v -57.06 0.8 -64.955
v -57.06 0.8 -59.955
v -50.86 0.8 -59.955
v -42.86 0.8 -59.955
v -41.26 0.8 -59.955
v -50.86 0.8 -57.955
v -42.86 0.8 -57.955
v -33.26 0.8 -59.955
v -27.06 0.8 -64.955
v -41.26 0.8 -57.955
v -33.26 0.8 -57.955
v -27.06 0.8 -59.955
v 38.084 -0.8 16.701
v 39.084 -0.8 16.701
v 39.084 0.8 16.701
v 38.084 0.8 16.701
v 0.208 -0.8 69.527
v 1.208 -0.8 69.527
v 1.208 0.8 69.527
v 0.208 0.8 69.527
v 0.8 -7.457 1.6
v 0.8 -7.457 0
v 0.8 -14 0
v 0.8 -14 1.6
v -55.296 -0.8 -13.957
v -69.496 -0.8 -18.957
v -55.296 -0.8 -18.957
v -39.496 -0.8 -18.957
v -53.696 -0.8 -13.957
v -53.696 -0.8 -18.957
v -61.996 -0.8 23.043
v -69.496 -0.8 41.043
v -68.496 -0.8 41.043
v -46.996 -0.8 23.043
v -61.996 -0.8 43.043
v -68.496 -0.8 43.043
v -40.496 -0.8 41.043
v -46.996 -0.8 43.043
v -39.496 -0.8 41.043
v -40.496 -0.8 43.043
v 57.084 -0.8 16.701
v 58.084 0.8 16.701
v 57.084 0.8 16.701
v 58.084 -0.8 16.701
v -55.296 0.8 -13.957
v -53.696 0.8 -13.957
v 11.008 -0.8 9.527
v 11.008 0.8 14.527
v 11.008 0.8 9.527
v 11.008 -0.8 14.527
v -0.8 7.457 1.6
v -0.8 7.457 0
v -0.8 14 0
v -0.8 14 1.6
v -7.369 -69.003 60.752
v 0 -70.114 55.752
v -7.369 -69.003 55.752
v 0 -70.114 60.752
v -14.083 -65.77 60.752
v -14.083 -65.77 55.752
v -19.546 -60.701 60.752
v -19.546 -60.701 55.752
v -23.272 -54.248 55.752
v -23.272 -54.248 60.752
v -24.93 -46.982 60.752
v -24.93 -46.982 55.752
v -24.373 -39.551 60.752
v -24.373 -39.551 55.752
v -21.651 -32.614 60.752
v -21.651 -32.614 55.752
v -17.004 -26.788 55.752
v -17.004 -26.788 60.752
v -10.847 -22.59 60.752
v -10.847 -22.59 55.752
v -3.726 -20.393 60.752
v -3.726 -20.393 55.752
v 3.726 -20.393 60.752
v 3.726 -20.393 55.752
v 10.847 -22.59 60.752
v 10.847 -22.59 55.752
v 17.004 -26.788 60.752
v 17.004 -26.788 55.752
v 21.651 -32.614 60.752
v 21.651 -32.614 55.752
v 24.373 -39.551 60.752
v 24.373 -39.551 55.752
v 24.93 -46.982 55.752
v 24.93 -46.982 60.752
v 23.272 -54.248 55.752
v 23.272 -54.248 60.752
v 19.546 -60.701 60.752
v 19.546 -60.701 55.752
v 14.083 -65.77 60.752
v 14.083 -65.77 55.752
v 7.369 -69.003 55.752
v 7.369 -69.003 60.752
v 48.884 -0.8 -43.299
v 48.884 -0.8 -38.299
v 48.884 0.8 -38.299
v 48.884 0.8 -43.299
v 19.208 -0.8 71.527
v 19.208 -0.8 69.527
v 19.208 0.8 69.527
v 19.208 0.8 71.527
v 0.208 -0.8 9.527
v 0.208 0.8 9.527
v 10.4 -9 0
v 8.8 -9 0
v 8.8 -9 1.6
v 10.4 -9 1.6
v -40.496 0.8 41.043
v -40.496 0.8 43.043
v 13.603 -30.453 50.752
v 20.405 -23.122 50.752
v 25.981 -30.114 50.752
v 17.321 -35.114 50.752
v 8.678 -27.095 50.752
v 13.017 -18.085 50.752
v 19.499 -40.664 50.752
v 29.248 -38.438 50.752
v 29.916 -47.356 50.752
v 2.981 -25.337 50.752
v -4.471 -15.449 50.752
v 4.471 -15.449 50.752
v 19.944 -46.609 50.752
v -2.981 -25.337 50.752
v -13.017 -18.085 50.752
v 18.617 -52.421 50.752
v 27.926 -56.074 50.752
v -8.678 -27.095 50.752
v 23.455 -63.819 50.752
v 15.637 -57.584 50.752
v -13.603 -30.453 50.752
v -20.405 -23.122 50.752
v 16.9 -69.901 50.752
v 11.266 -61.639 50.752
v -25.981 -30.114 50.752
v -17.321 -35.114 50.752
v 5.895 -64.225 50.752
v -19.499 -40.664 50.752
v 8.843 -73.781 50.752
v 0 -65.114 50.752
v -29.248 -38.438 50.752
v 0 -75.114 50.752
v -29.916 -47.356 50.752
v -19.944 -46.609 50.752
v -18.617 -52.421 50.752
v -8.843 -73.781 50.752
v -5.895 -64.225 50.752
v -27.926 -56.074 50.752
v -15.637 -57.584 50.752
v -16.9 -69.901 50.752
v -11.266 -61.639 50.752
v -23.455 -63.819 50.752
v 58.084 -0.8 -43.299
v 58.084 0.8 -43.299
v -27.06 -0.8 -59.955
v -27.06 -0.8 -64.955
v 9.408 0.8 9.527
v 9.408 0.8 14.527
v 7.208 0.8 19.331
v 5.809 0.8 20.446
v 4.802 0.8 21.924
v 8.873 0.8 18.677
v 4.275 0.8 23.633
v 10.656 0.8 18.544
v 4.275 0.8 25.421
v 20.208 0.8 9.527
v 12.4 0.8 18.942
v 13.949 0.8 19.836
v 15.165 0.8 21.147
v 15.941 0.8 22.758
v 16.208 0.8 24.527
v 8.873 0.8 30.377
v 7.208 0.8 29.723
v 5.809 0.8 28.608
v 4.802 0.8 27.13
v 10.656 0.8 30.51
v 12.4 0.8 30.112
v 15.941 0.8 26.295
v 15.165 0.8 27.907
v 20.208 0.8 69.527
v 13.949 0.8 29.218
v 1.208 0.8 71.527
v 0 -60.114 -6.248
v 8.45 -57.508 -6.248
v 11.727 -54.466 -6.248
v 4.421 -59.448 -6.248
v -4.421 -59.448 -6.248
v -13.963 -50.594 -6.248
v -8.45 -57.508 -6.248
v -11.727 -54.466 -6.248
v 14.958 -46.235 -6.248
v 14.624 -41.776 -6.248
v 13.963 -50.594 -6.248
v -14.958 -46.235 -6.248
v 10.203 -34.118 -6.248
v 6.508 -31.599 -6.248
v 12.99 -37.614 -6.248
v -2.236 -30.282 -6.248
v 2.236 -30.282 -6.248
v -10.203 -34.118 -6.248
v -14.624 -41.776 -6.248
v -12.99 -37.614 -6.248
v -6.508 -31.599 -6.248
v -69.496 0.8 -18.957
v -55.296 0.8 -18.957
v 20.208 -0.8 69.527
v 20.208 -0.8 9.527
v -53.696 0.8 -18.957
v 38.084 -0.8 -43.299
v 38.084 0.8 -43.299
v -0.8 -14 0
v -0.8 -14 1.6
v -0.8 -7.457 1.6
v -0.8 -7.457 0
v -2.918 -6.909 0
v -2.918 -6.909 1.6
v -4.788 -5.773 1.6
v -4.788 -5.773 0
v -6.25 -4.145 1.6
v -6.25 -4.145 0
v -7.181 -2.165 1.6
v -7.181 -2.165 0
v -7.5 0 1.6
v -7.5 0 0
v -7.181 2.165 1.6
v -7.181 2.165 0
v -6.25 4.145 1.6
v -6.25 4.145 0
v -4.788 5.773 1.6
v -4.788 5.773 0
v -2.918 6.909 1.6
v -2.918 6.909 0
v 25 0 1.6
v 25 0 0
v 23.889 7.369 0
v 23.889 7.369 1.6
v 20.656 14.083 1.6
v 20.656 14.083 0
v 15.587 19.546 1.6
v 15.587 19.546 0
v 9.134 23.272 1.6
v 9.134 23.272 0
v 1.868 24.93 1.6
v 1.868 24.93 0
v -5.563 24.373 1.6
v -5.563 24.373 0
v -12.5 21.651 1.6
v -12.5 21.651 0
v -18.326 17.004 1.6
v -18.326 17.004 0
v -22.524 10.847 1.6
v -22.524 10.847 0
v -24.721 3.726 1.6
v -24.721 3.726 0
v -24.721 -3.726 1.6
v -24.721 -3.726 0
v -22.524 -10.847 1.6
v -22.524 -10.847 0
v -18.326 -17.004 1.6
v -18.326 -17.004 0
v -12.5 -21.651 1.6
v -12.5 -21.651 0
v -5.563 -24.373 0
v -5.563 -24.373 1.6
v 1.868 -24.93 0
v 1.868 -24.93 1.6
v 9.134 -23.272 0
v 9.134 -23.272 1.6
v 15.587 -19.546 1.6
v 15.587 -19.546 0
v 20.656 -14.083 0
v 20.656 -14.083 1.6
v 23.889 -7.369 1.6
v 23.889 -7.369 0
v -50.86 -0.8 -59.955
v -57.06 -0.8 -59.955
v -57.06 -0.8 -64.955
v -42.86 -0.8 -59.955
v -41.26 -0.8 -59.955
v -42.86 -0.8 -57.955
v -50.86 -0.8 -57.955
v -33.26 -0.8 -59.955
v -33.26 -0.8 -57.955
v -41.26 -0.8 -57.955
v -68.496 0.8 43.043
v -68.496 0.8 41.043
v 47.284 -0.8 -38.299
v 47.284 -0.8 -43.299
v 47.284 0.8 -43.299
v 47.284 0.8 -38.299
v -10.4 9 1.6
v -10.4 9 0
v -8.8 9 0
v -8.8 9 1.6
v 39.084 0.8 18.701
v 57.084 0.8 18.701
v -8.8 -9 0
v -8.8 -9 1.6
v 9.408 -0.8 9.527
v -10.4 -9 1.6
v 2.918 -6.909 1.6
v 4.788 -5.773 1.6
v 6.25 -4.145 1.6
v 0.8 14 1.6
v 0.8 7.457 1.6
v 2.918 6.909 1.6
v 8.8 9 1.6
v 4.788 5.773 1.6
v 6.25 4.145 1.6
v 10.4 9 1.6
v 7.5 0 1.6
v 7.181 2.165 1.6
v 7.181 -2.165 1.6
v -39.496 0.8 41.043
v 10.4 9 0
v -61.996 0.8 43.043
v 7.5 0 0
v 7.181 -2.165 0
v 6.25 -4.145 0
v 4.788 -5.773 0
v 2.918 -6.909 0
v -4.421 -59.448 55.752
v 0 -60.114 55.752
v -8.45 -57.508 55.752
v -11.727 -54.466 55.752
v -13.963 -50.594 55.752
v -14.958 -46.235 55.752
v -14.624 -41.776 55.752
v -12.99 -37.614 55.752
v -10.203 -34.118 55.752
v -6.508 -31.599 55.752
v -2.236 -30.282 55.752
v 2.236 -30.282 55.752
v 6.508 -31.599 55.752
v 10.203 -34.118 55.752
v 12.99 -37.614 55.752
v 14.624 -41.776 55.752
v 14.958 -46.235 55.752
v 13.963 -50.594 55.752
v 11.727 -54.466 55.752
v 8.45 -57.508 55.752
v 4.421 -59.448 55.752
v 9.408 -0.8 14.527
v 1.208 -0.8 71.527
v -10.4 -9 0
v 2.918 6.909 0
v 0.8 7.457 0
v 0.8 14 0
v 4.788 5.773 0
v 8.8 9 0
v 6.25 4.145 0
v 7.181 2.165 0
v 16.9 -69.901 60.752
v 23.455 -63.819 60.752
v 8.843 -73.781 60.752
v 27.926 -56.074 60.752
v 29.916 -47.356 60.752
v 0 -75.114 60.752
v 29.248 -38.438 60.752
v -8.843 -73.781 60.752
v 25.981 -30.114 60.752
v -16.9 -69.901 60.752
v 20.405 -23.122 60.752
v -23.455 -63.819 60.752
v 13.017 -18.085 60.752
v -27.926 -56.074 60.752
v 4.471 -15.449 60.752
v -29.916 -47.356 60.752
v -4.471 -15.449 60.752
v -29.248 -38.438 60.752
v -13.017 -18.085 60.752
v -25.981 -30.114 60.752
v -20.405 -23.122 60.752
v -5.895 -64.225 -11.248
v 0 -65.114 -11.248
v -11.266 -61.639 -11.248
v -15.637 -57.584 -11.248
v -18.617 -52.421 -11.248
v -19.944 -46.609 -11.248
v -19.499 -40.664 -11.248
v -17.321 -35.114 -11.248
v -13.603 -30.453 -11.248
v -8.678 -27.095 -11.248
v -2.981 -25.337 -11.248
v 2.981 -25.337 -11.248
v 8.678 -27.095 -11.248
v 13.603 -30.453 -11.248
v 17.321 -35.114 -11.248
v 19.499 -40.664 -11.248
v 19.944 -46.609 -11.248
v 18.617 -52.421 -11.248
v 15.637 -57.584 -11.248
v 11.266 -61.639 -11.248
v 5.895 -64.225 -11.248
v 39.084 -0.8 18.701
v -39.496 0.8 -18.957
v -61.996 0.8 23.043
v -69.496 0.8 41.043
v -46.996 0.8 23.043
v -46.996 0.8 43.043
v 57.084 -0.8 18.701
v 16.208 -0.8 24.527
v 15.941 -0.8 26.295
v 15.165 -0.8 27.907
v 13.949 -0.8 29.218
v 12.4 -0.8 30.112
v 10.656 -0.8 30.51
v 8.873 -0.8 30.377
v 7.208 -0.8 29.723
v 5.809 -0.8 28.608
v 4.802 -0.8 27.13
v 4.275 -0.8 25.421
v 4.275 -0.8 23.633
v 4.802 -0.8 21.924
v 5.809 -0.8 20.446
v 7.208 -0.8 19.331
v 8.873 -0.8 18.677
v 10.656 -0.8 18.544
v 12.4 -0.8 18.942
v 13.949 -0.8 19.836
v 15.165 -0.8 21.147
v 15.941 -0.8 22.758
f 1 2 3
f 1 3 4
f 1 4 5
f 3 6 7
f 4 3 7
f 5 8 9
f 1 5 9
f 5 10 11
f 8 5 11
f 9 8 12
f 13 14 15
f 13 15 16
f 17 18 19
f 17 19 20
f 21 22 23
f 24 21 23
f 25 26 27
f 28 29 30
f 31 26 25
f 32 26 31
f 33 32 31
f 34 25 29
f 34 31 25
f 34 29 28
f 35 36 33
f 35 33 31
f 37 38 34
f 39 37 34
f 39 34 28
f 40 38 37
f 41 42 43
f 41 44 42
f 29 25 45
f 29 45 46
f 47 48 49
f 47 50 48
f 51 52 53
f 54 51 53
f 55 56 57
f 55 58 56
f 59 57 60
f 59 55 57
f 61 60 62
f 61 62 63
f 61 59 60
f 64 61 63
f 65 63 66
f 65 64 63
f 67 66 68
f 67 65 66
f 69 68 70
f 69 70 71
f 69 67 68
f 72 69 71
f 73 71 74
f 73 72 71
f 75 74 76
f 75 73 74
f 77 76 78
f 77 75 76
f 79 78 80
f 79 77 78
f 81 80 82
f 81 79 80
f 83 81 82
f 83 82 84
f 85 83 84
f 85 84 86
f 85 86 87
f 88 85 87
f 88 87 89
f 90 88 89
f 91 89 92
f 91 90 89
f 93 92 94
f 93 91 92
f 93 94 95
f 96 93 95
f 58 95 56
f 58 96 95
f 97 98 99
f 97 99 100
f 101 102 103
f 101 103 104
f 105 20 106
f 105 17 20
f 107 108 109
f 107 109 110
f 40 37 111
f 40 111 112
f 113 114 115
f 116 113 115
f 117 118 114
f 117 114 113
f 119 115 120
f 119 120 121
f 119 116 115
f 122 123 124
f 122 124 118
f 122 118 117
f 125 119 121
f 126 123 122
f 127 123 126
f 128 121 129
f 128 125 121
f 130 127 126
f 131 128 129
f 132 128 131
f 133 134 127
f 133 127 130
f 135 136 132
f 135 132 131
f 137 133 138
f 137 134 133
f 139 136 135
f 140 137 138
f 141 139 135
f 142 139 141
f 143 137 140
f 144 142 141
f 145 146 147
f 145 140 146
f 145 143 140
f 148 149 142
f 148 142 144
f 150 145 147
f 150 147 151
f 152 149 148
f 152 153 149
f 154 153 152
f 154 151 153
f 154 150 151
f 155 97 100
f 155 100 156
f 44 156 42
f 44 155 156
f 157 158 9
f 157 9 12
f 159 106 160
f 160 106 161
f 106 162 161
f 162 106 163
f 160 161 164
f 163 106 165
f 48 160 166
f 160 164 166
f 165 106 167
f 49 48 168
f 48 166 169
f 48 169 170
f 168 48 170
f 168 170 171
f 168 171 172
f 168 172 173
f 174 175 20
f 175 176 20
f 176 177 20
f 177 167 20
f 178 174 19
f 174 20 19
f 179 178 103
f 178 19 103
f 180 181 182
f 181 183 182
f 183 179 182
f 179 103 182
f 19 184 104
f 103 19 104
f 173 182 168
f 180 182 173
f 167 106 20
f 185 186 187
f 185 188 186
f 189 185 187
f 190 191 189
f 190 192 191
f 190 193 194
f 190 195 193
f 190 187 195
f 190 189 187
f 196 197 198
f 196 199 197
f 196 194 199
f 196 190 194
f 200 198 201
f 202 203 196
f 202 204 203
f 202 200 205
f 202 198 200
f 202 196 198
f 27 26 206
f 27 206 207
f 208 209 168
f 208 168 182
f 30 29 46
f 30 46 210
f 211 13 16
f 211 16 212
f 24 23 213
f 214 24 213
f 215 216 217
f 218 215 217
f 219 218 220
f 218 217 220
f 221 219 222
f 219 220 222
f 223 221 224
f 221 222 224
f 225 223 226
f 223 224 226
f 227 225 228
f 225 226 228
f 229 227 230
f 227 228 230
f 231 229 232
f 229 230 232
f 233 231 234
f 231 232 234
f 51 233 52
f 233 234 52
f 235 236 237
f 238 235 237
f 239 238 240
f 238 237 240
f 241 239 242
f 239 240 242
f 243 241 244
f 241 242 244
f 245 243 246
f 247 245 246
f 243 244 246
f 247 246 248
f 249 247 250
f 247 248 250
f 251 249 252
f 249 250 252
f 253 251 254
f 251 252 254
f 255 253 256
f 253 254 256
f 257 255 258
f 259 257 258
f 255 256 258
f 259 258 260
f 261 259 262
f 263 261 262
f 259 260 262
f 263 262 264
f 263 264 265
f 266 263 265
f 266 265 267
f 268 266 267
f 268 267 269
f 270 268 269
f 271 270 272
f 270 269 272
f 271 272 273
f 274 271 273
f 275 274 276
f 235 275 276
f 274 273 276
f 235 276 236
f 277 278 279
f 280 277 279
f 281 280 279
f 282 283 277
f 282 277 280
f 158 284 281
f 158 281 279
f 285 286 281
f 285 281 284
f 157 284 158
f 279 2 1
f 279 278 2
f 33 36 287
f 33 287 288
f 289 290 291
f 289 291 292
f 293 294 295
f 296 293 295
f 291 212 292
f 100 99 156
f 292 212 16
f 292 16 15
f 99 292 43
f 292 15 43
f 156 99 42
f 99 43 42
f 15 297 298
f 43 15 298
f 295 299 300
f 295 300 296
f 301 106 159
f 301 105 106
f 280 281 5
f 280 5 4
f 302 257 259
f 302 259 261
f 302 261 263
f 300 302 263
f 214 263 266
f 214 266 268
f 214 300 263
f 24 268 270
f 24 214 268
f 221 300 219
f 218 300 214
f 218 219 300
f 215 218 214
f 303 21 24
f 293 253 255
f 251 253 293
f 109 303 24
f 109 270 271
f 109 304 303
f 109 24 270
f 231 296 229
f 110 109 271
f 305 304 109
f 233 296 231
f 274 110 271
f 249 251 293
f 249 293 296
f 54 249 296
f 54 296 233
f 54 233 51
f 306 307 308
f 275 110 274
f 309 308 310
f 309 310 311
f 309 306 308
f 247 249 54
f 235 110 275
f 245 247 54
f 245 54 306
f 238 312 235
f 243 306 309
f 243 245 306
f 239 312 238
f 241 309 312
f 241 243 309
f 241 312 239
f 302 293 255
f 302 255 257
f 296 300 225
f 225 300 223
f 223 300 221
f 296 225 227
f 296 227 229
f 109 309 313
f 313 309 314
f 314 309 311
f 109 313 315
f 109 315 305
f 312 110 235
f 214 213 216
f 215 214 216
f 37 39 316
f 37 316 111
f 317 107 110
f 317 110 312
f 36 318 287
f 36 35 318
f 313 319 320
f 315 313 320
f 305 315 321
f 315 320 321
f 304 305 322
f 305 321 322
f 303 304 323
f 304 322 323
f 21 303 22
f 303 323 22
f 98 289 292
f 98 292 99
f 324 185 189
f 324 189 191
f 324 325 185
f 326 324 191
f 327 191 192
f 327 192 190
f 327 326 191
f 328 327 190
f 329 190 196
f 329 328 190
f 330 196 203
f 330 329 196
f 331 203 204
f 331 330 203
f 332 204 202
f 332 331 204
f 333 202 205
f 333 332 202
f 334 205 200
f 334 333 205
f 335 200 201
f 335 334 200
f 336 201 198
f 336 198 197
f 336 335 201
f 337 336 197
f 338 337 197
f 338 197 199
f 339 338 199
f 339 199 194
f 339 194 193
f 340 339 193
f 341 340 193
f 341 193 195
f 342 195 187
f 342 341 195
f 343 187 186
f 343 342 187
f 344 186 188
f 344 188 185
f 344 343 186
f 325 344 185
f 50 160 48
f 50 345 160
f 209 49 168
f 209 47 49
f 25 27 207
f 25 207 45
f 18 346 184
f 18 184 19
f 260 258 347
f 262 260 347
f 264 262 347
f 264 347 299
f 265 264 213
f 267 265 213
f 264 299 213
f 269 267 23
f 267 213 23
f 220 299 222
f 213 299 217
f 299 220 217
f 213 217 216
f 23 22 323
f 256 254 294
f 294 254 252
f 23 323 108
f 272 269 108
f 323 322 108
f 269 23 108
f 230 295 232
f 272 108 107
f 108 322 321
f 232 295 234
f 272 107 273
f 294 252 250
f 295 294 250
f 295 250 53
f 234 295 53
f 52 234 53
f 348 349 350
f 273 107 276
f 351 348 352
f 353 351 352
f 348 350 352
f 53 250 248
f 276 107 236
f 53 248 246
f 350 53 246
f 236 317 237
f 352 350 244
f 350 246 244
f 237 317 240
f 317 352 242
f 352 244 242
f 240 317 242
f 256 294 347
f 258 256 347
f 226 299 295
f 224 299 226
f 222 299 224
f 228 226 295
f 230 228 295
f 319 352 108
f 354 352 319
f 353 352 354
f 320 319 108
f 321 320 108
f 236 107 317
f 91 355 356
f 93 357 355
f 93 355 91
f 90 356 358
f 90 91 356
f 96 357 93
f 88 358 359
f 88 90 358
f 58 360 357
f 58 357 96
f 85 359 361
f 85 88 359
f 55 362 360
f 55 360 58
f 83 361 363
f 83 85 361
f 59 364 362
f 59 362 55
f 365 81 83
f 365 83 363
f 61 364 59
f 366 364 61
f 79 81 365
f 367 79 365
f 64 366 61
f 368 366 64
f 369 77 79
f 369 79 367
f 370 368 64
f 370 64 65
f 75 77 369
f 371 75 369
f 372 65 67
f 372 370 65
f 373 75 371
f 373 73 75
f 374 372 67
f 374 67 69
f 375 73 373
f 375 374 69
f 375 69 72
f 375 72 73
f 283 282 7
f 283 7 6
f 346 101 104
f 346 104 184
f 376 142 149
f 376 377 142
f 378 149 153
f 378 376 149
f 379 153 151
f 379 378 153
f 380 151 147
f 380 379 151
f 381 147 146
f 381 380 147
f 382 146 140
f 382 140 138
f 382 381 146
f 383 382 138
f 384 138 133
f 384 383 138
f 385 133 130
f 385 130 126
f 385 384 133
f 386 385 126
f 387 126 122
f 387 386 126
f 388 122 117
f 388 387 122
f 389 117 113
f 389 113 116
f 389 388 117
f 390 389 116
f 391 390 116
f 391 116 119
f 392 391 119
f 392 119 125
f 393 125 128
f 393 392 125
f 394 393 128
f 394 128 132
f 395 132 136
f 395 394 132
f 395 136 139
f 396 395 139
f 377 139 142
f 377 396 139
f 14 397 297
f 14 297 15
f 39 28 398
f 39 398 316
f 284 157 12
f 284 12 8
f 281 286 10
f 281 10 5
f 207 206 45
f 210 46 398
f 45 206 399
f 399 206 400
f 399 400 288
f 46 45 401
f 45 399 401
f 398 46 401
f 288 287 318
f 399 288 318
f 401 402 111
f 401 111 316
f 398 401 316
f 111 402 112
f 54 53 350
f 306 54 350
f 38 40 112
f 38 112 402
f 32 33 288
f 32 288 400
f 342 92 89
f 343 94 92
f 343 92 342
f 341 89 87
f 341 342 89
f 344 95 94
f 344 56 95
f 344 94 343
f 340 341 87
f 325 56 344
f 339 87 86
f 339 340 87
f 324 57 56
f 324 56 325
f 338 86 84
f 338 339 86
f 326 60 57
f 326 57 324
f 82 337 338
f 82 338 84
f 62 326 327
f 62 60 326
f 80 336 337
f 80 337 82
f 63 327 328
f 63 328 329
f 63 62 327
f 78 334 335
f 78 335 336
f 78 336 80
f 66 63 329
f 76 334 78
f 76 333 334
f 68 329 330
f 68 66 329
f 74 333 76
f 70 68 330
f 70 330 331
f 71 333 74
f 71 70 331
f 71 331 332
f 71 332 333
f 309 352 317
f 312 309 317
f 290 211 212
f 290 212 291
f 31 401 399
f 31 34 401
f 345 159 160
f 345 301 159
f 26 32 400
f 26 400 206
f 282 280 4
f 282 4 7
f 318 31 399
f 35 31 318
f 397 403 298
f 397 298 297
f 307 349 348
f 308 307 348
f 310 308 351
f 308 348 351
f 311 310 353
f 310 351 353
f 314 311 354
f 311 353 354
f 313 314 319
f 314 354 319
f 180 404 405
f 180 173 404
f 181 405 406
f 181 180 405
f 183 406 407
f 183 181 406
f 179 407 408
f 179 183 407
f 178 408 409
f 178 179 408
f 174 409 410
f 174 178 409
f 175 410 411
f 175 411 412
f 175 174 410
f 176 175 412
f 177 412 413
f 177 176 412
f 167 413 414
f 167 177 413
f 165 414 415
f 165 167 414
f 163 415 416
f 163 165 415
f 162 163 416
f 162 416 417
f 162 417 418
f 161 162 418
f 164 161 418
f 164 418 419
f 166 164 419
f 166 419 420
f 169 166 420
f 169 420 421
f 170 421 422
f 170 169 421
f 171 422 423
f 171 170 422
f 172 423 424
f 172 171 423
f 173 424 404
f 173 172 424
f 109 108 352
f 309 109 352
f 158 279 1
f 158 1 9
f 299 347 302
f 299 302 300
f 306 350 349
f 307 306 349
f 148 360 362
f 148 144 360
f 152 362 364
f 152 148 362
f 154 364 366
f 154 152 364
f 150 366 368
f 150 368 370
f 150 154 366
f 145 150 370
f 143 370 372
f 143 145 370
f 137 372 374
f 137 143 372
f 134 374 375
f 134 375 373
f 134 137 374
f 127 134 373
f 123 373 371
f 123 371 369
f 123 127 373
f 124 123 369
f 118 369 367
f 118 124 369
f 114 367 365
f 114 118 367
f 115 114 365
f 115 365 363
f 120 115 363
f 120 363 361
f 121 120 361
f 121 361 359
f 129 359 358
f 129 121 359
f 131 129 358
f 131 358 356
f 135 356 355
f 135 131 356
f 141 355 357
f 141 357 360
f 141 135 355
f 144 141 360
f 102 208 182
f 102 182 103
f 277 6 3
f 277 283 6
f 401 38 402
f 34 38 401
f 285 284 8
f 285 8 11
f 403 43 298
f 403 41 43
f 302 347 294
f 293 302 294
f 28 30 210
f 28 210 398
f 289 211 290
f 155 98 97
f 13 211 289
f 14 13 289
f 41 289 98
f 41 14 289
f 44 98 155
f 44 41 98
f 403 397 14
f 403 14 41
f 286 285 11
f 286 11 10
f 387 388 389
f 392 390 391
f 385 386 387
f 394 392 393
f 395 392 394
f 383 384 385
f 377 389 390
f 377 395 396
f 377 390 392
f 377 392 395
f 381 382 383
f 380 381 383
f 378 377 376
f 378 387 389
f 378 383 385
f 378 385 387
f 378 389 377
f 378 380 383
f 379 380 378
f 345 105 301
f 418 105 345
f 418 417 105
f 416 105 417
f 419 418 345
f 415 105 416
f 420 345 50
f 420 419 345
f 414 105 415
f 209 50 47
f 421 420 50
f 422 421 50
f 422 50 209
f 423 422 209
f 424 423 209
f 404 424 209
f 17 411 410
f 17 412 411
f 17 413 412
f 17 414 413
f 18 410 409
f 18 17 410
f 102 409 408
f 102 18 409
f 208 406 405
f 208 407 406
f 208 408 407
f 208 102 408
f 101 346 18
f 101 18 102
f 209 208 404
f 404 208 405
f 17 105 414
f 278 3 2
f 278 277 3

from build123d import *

# Parameters (mm, degrees)
F0_R     = 25
F0_W     = 1.6
F0_H     = 18
F1_DEPTH = 1.6
F3_DEPTH = 0.8
F5_DEPTH = 0.8
F6_R     = 6
F7_DEPTH = 0.8
F9_DEPTH = 0.8


with BuildPart() as f1:
    # F0 (on Top) → F1 (new body)
    with BuildSketch(Plane.XY):
        Circle(F0_R)
        with Locations((-9.6, 0)):
            Rectangle(F0_W, F0_H, mode=Mode.SUBTRACT)
        with BuildLine():
            ThreePointArc((0.8, 7.457211), (5.578978, 5.012484), (7.5, 0))
            ThreePointArc((7.5, 0), (5.578978, -5.012484), (0.8, -7.457211))
            Line((0.8, -7.457211), (0.8, -14))
            Line((0.8, -14), (-0.8, -14))
            Line((-0.8, -14), (-0.8, -7.457211))
            ThreePointArc((-0.8, -7.457211), (-7.5, 0), (-0.8, 7.457211))
            Line((-0.8, 7.457211), (-0.8, 14))
            Line((-0.8, 14), (0.8, 14))
            Line((0.8, 14), (0.8, 7.457211))
        make_face(mode=Mode.SUBTRACT)
        with Locations((9.6, 0)):
            Rectangle(F0_W, F0_H, mode=Mode.SUBTRACT)
    extrude(amount=F1_DEPTH)


with BuildPart() as f3:
    # F2 (on Front) → F3 (new body, symmetric)
    with BuildSketch(Plane.XZ):
        Polygon((-61.996324, 43.042513), (-68.496324, 43.042513), (-68.496324, 41.042513), (-69.496324, 41.042513), (-69.496324, -18.957487), (-55.296324, -18.957487), (-55.296324, -13.957487), (-53.696324, -13.957487), (-53.696324, -18.957487), (-39.496324, -18.957487), (-39.496324, 41.042513), (-40.496324, 41.042513), (-40.496324, 43.042513), (-46.996324, 43.042513), (-46.996324, 23.042513), (-61.996324, 23.042513), align=None)
    extrude(amount=F3_DEPTH, both=True)


with BuildPart() as f5:
    # F4 (on Front) → F5 (new body, symmetric)
    with BuildSketch(Plane.XZ):
        Polygon((57.083729, 16.70141), (57.083729, 18.70141), (39.083729, 18.70141), (39.083729, 16.70141), (38.083729, 16.70141), (38.083729, -43.29859), (47.283729, -43.29859), (47.283729, -38.29859), (48.883729, -38.29859), (48.883729, -43.29859), (58.083729, -43.29859), (58.083729, 16.70141), align=None)
    extrude(amount=F5_DEPTH, both=True)


with BuildPart() as f7:
    # F6 (on Front) → F7 (new body, symmetric)
    with BuildSketch(Plane.XZ):
        Polygon((11.007798, 9.526967), (20.207798, 9.526967), (20.207798, 69.526967), (19.207798, 69.526967), (19.207798, 71.526967), (1.207798, 71.526967), (1.207798, 69.526967), (0.207798, 69.526967), (0.207798, 9.526967), (9.407798, 9.526967), (9.407798, 14.526967), (11.007798, 14.526967), align=None)
        with Locations((10.207798, 24.526967)):
            Circle(F6_R, mode=Mode.SUBTRACT)
    extrude(amount=F7_DEPTH, both=True)


with BuildPart() as f9:
    # F8 (on Front) → F9 (new body, symmetric)
    with BuildSketch(Plane.XZ):
        Polygon((-57.060106, -59.955354), (-57.060106, -64.955354), (-27.060106, -64.955354), (-27.060106, -59.955354), (-33.260106, -59.955354), (-33.260106, -57.955354), (-41.260106, -57.955354), (-41.260106, -59.955354), (-42.860106, -59.955354), (-42.860106, -57.955354), (-50.860106, -57.955354), (-50.860106, -59.955354), align=None)
    extrude(amount=F9_DEPTH, both=True)


with BuildPart() as f11:
    # F10 (on Right) → F11 (revolve)
    with BuildSketch(Plane.YZ):
        Polygon((-45.114002, -11.248204), (-45.114002, -6.248204), (-60.114002, -6.248204), (-60.114002, 55.751796), (-70.114002, 55.751796), (-70.114002, 60.751796), (-75.114002, 60.751796), (-75.114002, 50.751796), (-65.114002, 50.751796), (-65.114002, -11.248204), align=None)
    revolve(axis=Axis((0, -45.114002, -8.748204), (0, 0, -1)))


solid = Compound([f1.part, f3.part, f5.part, f7.part, f9.part, f11.part])
